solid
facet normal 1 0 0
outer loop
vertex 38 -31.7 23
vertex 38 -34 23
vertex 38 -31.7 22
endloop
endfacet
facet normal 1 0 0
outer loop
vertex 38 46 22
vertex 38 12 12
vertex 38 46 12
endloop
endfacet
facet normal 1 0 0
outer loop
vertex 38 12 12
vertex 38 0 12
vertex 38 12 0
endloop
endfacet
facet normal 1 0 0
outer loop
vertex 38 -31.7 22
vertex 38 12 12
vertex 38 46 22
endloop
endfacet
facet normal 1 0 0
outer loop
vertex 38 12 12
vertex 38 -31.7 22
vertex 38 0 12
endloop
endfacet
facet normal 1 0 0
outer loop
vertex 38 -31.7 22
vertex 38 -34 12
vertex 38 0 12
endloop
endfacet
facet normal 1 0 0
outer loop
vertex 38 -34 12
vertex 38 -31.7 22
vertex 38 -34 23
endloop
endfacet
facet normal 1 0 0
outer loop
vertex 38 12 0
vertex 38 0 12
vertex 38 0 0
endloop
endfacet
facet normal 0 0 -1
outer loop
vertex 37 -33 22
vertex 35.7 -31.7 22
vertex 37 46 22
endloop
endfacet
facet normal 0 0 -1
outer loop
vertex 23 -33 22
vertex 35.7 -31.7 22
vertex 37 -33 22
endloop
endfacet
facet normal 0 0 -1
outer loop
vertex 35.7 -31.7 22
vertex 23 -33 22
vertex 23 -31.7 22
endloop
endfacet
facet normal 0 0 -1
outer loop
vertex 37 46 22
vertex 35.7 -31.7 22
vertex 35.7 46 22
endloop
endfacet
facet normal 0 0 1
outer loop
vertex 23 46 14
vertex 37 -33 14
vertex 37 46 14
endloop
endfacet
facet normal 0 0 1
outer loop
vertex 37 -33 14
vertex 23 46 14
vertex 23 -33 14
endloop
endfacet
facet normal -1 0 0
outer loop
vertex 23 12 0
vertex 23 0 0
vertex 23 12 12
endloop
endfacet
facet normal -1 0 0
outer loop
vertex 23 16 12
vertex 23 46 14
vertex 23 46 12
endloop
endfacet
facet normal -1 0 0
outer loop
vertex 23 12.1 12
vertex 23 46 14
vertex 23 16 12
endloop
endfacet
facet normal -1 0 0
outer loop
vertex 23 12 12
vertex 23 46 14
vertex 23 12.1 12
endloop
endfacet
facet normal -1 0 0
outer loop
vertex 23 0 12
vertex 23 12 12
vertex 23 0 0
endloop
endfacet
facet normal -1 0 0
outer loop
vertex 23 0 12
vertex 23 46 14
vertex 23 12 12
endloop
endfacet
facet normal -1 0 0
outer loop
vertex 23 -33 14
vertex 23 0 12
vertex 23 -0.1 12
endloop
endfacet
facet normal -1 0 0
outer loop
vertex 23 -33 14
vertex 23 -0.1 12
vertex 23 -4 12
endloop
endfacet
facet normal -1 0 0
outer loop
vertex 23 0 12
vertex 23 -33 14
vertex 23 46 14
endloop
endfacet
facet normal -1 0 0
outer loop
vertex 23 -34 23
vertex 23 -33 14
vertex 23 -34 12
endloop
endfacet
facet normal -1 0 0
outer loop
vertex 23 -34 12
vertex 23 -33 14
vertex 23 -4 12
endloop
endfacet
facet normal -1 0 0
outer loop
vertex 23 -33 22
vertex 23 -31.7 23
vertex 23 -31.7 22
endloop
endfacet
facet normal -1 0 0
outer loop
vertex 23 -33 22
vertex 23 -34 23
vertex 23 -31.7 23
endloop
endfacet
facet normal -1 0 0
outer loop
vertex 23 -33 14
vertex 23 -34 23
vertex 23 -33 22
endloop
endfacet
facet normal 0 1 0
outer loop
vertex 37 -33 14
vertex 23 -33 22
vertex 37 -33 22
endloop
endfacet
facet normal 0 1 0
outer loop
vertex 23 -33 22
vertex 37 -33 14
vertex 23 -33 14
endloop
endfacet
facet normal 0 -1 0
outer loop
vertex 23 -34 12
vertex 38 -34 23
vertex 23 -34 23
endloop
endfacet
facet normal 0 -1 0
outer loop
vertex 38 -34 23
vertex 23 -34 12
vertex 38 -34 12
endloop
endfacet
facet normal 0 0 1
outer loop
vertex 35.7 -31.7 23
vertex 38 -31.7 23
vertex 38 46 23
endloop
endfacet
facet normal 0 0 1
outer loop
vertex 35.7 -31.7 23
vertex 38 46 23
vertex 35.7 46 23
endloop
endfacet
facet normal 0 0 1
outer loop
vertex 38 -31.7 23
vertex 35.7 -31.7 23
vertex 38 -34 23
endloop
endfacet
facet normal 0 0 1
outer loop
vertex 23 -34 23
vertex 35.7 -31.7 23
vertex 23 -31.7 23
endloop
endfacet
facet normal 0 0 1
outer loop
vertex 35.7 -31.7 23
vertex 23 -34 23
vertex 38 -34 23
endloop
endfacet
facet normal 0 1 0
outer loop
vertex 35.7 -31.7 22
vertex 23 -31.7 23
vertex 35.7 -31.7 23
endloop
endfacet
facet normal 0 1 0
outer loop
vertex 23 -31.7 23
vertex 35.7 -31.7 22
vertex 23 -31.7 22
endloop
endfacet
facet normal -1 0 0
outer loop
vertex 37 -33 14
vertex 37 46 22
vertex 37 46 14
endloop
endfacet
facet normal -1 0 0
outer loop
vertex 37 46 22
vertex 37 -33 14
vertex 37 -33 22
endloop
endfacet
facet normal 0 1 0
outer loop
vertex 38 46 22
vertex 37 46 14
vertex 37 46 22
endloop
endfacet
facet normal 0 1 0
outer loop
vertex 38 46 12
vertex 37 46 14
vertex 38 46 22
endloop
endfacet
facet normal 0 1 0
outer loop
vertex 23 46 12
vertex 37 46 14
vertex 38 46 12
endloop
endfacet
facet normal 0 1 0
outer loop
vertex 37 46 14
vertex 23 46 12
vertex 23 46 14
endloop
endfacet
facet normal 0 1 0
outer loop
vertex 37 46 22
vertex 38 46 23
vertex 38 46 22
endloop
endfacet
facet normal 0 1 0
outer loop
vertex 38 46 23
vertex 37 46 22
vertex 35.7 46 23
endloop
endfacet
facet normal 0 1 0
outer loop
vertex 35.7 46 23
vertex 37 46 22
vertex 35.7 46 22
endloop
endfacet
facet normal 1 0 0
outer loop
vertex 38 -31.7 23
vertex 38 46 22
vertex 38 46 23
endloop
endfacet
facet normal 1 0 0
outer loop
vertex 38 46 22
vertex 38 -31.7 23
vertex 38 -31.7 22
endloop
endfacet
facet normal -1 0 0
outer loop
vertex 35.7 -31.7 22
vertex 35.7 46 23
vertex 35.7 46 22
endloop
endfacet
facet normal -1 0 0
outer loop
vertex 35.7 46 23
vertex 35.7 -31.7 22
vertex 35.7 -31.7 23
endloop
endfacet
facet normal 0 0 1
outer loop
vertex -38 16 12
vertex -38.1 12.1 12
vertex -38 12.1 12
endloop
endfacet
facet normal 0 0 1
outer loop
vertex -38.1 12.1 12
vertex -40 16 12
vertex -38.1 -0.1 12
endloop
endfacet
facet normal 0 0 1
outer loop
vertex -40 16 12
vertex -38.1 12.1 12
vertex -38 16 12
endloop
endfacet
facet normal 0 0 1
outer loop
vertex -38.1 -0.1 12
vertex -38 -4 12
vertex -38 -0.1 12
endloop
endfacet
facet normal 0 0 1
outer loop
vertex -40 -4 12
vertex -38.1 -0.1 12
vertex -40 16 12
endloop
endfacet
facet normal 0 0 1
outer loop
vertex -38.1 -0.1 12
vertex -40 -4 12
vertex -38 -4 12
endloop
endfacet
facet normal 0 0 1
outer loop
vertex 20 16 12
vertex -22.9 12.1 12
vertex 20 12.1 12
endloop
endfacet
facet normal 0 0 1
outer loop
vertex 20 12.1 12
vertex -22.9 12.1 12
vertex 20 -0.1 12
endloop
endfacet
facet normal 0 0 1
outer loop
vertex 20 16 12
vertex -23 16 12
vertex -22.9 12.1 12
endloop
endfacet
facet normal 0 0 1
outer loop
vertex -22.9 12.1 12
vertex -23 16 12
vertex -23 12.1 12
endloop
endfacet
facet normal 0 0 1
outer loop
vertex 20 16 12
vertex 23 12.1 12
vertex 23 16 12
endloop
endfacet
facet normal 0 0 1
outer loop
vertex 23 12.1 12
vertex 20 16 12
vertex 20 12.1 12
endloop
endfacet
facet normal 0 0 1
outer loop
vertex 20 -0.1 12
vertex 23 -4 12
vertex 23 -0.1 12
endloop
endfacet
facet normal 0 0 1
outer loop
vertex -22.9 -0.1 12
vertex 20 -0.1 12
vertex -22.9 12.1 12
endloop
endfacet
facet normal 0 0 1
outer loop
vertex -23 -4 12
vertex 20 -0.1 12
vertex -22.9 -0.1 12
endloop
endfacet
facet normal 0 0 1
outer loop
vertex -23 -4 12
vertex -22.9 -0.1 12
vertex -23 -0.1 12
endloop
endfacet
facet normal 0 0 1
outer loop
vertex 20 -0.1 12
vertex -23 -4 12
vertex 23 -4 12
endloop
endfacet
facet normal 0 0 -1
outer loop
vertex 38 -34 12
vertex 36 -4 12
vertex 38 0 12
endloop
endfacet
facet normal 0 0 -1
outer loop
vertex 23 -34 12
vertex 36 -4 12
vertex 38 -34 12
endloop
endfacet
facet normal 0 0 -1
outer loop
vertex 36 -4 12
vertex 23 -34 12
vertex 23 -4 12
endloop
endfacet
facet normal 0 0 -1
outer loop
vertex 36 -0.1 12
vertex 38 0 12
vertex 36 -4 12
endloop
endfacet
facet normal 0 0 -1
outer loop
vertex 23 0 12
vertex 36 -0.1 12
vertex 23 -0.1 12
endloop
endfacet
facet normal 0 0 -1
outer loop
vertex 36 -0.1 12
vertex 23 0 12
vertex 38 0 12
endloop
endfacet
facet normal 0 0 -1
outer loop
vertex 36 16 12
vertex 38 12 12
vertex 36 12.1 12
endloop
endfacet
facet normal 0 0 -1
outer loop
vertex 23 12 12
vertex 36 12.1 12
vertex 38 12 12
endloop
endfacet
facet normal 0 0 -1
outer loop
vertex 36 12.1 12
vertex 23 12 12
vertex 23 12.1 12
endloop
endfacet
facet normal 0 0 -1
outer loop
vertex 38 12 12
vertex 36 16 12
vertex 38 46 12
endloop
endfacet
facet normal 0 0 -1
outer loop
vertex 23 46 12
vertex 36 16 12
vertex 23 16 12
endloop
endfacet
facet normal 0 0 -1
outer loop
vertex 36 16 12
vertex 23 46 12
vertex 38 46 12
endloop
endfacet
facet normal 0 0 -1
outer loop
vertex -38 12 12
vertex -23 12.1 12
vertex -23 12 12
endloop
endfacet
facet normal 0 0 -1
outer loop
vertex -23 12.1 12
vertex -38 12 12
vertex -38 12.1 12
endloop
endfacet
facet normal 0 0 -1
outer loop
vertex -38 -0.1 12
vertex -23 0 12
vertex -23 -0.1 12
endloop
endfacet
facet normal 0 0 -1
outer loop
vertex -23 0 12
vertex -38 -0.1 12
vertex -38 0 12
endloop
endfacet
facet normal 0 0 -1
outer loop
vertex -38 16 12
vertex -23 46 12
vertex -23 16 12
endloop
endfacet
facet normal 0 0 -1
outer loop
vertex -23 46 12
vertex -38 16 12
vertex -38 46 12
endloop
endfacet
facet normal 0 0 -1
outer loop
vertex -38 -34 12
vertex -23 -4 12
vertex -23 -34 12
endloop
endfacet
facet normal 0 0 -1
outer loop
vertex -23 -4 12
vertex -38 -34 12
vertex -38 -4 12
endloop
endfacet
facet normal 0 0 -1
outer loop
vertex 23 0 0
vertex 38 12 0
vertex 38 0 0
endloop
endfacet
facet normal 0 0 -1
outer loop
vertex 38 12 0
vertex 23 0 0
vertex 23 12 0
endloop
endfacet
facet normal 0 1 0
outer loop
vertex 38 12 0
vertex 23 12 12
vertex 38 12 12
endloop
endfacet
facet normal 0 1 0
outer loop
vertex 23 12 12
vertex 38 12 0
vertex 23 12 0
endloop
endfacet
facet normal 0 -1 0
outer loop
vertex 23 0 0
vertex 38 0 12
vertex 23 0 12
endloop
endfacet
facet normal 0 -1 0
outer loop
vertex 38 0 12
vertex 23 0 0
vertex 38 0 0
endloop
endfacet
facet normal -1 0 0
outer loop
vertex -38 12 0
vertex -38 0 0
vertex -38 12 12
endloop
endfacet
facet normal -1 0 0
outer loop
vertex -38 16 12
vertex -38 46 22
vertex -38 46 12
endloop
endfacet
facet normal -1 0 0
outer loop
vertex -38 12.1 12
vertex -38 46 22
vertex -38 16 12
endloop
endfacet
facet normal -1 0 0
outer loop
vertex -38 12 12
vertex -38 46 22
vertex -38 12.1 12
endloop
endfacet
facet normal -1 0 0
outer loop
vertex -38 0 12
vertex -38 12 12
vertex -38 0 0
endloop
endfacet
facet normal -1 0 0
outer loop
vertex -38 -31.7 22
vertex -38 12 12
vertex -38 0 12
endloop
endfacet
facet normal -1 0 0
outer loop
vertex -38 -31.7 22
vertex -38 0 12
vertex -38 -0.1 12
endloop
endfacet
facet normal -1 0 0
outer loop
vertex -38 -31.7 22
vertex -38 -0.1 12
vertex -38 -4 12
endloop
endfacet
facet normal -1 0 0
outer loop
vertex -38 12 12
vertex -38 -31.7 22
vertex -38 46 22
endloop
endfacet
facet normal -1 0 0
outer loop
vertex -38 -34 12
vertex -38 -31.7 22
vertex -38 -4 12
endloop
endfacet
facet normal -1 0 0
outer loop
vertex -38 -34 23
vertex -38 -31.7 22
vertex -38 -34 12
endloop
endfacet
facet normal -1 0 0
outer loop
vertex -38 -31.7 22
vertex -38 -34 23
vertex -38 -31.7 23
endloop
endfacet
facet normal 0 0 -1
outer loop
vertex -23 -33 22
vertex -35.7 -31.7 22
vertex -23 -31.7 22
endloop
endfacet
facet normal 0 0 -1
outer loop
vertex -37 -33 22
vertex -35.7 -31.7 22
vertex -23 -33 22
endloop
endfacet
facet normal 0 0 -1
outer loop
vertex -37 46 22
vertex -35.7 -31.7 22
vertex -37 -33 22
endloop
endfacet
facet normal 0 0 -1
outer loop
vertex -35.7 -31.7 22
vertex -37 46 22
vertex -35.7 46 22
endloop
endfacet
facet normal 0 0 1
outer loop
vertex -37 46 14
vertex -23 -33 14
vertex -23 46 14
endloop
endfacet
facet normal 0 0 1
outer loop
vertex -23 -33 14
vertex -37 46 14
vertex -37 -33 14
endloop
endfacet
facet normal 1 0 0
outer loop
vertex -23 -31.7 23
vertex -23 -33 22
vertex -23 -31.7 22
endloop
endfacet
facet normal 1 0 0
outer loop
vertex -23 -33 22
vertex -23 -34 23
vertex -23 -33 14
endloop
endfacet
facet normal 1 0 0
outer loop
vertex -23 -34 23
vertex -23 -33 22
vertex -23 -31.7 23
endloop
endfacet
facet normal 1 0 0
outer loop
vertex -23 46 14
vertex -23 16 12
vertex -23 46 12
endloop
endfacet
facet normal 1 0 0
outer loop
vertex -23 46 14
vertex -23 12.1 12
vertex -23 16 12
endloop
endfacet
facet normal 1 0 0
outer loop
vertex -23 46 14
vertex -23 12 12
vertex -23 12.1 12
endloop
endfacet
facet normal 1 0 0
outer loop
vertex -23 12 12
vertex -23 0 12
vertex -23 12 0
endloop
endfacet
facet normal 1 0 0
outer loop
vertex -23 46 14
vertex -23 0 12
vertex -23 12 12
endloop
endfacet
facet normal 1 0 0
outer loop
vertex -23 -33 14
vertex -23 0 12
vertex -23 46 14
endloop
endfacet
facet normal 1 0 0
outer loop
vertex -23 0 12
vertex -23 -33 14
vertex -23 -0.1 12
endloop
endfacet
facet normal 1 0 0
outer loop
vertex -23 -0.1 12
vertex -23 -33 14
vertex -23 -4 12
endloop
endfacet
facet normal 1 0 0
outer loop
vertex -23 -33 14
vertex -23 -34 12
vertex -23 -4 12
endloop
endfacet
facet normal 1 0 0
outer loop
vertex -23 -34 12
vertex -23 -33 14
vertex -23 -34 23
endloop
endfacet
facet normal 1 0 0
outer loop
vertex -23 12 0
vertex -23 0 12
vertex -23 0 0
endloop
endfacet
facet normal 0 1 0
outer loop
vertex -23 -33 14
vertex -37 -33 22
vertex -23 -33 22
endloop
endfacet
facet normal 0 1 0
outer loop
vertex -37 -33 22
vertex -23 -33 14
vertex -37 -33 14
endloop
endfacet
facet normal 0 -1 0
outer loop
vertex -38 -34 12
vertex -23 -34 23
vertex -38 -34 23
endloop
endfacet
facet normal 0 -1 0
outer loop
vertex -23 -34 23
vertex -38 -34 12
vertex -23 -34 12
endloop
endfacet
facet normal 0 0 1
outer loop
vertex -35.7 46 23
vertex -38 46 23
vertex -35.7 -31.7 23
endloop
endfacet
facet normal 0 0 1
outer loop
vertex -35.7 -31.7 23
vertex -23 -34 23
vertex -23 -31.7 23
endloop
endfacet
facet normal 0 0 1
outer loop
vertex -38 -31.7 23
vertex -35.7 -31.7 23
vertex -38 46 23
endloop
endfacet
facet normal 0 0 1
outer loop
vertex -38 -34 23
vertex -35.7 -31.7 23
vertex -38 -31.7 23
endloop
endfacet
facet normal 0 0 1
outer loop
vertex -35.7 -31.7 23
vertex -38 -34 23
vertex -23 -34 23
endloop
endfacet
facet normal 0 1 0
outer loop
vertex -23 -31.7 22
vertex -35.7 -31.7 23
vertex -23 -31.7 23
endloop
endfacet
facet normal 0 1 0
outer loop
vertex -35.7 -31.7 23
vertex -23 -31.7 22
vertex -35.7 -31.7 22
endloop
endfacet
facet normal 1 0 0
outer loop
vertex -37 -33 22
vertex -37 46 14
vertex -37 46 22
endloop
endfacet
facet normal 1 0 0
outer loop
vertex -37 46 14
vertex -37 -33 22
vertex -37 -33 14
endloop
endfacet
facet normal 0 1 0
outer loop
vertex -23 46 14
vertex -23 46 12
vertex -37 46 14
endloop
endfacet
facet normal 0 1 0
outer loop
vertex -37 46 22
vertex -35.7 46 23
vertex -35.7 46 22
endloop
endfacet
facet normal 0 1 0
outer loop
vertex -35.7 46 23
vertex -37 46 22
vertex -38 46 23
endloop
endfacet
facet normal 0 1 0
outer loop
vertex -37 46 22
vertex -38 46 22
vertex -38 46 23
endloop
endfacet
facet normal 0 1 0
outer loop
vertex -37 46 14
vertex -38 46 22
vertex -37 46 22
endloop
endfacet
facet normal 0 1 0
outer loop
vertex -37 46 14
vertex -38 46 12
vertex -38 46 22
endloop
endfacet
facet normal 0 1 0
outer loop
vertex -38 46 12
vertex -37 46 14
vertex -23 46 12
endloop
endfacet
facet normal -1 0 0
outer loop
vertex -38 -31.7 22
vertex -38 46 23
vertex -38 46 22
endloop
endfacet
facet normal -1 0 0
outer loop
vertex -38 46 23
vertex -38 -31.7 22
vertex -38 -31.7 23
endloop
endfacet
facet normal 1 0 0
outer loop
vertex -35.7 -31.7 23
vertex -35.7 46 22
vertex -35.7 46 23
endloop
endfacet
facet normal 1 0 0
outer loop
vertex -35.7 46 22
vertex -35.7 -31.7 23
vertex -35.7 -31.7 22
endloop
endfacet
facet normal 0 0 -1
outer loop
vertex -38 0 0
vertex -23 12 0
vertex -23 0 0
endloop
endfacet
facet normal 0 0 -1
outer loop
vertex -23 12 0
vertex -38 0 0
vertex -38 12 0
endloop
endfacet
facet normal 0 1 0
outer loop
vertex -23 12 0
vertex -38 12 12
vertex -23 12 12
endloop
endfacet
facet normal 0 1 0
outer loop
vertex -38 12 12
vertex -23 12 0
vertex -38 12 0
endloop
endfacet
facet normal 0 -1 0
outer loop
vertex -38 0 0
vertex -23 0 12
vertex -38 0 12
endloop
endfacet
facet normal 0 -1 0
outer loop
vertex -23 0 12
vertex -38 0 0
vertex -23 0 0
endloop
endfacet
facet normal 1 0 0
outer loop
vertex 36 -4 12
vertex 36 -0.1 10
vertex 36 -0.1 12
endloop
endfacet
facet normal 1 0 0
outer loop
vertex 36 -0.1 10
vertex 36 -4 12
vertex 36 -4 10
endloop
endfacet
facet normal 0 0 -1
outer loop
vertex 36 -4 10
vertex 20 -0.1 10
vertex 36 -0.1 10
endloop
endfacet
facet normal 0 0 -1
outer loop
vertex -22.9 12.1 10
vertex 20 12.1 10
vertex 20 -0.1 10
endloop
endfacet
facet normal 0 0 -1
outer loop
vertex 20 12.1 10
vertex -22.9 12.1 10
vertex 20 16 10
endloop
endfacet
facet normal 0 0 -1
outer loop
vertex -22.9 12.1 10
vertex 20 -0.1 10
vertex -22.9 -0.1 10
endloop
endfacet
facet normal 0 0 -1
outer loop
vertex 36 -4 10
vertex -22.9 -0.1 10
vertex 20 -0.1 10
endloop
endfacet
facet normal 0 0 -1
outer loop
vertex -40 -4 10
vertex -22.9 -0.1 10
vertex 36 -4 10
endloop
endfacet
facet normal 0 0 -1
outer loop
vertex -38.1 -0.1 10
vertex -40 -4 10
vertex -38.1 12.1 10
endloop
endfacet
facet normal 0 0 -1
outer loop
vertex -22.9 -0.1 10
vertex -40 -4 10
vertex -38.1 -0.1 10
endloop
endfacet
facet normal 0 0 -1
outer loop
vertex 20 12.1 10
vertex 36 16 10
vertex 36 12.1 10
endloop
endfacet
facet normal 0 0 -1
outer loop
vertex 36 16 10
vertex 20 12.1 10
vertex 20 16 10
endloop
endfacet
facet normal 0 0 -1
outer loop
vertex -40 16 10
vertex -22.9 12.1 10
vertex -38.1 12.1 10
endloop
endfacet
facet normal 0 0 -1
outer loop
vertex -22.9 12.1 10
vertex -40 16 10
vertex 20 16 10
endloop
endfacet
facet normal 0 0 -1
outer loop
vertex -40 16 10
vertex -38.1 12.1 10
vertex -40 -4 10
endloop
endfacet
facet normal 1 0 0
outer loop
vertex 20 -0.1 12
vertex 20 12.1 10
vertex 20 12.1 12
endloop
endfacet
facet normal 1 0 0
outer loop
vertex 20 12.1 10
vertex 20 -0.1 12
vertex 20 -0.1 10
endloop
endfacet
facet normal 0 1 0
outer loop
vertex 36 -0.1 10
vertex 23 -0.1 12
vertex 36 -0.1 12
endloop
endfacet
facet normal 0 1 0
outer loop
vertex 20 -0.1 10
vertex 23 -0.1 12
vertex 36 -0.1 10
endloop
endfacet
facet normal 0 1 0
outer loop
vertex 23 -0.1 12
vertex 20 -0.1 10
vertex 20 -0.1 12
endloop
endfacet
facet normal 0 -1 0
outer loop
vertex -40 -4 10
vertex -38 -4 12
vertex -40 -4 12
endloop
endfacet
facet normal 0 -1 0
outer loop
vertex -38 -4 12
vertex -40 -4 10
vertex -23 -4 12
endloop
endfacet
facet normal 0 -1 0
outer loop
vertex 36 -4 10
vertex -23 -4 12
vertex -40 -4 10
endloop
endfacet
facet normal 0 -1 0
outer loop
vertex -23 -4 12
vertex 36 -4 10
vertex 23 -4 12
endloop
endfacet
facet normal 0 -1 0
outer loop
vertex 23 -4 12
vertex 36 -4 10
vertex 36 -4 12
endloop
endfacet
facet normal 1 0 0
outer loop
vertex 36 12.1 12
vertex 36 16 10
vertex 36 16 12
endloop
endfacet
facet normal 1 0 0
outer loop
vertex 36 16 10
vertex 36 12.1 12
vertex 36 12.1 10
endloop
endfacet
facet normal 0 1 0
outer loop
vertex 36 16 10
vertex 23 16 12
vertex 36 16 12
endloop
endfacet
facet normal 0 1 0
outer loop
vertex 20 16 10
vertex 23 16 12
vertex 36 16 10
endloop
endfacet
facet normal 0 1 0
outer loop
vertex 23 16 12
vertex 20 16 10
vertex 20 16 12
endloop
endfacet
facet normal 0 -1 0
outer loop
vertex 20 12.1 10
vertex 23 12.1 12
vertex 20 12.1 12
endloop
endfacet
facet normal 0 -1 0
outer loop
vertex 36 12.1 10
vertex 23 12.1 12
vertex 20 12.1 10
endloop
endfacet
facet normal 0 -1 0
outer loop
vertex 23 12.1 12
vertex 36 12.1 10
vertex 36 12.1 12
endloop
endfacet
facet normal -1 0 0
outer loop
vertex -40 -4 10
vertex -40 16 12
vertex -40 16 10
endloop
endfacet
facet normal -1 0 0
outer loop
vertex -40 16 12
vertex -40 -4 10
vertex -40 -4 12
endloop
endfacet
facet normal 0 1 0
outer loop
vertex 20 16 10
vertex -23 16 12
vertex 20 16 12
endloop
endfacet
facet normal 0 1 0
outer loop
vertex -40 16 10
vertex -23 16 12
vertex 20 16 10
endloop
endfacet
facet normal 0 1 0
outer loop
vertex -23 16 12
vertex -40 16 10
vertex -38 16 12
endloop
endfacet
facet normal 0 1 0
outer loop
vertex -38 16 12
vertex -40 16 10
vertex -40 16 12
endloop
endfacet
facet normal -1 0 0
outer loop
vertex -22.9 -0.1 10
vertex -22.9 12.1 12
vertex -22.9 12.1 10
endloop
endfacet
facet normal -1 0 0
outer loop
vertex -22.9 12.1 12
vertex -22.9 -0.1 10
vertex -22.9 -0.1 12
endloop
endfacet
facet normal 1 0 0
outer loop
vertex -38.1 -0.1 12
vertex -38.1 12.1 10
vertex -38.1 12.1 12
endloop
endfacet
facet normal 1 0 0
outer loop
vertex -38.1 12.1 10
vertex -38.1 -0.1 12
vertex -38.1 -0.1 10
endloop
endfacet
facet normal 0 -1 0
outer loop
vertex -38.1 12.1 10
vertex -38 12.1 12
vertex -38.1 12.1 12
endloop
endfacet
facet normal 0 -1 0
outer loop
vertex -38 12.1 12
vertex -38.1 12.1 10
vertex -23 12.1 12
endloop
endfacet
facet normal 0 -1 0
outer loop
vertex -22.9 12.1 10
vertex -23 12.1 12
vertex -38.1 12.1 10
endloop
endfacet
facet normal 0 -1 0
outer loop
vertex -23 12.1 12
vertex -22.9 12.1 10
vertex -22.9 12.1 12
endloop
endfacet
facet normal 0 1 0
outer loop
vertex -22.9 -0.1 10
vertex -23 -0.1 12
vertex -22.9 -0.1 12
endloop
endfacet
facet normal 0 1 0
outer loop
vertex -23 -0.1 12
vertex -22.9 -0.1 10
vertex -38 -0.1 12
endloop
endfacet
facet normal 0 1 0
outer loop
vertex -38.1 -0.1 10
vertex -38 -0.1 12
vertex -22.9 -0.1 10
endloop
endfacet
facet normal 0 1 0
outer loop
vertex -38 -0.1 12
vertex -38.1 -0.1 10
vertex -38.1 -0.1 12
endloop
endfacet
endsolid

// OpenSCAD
// file: ../parts/span.scad
use<./clip.scad>

clearance = 0.2;
function prongWidth() = 4;
function spanZ() = 2;
module span() {
  color("darkorchid")
  difference() {
    union(){
      prongLength = 16;
      prongSpacing = nutY()+.2;
      cube([prongLength, prongWidth()-clearance/2, spanZ()]);
      translate([0, prongSpacing+prongWidth()-clearance/2, 0]) cube([prongLength, prongWidth()-clearance/2, spanZ()]);
      straightLength = 2 + nutX() + 43 ;
      translate([-straightLength, 0, 0]) cube([straightLength, prongWidth()*2+prongSpacing-clearance, spanZ()]);
    };
    translate(-[nutX() + 43 + clearance/2, -prongWidth() + clearance/2, .5]) cube([nutX()+clearance, nutY()+clearance, 3]);
  }
}
span();
// file: ../parts/clip.scad
function nutY() = 12;
function nutX() = 15;

module clip() {
  nutX = nutX();
  nutZ = 12;
  cube([nutX, nutY(), nutZ]);

  module corner(xyz) { 
    lip = 1.3;
    height = 8;
    x1 = xyz[0];
    y1 = 1;

    translate([0,0,xyz[2]]) {
      cube([x1, y1, height]); 
      translate([0, 0, height]) {
        cube([x1, y1+lip, 1]);
      }
    }

    x2 = 1;
    y2 = xyz[1];

    translate([xyz[0]-x2, 0, xyz[2]]) {
      cube([x2, y2, height]);
      translate([-lip,0,height]) {
        cube([x2+lip, y2, 1]);
      }
    }
  };

  module cubeWithCorner(xyz) {
    cube(xyz);
    corner(xyz);
  }

  ySup = 80;
  translate([0, -ySup/2 + nutY()/2, nutZ]){
    cubeWithCorner([15, ySup, 2]);
  }
}

clip();
// main file
use<../parts/clip.scad>;
use<../parts/span.scad>;

spread = 46;

color("darkcyan") {
  translate([spread/2,0,0]) clip();
  mirror([1,0,0]){
    translate([spread/2, 0,0]) clip();
  }
}

translate([20, -prongWidth(), nutY()-2]) span();
